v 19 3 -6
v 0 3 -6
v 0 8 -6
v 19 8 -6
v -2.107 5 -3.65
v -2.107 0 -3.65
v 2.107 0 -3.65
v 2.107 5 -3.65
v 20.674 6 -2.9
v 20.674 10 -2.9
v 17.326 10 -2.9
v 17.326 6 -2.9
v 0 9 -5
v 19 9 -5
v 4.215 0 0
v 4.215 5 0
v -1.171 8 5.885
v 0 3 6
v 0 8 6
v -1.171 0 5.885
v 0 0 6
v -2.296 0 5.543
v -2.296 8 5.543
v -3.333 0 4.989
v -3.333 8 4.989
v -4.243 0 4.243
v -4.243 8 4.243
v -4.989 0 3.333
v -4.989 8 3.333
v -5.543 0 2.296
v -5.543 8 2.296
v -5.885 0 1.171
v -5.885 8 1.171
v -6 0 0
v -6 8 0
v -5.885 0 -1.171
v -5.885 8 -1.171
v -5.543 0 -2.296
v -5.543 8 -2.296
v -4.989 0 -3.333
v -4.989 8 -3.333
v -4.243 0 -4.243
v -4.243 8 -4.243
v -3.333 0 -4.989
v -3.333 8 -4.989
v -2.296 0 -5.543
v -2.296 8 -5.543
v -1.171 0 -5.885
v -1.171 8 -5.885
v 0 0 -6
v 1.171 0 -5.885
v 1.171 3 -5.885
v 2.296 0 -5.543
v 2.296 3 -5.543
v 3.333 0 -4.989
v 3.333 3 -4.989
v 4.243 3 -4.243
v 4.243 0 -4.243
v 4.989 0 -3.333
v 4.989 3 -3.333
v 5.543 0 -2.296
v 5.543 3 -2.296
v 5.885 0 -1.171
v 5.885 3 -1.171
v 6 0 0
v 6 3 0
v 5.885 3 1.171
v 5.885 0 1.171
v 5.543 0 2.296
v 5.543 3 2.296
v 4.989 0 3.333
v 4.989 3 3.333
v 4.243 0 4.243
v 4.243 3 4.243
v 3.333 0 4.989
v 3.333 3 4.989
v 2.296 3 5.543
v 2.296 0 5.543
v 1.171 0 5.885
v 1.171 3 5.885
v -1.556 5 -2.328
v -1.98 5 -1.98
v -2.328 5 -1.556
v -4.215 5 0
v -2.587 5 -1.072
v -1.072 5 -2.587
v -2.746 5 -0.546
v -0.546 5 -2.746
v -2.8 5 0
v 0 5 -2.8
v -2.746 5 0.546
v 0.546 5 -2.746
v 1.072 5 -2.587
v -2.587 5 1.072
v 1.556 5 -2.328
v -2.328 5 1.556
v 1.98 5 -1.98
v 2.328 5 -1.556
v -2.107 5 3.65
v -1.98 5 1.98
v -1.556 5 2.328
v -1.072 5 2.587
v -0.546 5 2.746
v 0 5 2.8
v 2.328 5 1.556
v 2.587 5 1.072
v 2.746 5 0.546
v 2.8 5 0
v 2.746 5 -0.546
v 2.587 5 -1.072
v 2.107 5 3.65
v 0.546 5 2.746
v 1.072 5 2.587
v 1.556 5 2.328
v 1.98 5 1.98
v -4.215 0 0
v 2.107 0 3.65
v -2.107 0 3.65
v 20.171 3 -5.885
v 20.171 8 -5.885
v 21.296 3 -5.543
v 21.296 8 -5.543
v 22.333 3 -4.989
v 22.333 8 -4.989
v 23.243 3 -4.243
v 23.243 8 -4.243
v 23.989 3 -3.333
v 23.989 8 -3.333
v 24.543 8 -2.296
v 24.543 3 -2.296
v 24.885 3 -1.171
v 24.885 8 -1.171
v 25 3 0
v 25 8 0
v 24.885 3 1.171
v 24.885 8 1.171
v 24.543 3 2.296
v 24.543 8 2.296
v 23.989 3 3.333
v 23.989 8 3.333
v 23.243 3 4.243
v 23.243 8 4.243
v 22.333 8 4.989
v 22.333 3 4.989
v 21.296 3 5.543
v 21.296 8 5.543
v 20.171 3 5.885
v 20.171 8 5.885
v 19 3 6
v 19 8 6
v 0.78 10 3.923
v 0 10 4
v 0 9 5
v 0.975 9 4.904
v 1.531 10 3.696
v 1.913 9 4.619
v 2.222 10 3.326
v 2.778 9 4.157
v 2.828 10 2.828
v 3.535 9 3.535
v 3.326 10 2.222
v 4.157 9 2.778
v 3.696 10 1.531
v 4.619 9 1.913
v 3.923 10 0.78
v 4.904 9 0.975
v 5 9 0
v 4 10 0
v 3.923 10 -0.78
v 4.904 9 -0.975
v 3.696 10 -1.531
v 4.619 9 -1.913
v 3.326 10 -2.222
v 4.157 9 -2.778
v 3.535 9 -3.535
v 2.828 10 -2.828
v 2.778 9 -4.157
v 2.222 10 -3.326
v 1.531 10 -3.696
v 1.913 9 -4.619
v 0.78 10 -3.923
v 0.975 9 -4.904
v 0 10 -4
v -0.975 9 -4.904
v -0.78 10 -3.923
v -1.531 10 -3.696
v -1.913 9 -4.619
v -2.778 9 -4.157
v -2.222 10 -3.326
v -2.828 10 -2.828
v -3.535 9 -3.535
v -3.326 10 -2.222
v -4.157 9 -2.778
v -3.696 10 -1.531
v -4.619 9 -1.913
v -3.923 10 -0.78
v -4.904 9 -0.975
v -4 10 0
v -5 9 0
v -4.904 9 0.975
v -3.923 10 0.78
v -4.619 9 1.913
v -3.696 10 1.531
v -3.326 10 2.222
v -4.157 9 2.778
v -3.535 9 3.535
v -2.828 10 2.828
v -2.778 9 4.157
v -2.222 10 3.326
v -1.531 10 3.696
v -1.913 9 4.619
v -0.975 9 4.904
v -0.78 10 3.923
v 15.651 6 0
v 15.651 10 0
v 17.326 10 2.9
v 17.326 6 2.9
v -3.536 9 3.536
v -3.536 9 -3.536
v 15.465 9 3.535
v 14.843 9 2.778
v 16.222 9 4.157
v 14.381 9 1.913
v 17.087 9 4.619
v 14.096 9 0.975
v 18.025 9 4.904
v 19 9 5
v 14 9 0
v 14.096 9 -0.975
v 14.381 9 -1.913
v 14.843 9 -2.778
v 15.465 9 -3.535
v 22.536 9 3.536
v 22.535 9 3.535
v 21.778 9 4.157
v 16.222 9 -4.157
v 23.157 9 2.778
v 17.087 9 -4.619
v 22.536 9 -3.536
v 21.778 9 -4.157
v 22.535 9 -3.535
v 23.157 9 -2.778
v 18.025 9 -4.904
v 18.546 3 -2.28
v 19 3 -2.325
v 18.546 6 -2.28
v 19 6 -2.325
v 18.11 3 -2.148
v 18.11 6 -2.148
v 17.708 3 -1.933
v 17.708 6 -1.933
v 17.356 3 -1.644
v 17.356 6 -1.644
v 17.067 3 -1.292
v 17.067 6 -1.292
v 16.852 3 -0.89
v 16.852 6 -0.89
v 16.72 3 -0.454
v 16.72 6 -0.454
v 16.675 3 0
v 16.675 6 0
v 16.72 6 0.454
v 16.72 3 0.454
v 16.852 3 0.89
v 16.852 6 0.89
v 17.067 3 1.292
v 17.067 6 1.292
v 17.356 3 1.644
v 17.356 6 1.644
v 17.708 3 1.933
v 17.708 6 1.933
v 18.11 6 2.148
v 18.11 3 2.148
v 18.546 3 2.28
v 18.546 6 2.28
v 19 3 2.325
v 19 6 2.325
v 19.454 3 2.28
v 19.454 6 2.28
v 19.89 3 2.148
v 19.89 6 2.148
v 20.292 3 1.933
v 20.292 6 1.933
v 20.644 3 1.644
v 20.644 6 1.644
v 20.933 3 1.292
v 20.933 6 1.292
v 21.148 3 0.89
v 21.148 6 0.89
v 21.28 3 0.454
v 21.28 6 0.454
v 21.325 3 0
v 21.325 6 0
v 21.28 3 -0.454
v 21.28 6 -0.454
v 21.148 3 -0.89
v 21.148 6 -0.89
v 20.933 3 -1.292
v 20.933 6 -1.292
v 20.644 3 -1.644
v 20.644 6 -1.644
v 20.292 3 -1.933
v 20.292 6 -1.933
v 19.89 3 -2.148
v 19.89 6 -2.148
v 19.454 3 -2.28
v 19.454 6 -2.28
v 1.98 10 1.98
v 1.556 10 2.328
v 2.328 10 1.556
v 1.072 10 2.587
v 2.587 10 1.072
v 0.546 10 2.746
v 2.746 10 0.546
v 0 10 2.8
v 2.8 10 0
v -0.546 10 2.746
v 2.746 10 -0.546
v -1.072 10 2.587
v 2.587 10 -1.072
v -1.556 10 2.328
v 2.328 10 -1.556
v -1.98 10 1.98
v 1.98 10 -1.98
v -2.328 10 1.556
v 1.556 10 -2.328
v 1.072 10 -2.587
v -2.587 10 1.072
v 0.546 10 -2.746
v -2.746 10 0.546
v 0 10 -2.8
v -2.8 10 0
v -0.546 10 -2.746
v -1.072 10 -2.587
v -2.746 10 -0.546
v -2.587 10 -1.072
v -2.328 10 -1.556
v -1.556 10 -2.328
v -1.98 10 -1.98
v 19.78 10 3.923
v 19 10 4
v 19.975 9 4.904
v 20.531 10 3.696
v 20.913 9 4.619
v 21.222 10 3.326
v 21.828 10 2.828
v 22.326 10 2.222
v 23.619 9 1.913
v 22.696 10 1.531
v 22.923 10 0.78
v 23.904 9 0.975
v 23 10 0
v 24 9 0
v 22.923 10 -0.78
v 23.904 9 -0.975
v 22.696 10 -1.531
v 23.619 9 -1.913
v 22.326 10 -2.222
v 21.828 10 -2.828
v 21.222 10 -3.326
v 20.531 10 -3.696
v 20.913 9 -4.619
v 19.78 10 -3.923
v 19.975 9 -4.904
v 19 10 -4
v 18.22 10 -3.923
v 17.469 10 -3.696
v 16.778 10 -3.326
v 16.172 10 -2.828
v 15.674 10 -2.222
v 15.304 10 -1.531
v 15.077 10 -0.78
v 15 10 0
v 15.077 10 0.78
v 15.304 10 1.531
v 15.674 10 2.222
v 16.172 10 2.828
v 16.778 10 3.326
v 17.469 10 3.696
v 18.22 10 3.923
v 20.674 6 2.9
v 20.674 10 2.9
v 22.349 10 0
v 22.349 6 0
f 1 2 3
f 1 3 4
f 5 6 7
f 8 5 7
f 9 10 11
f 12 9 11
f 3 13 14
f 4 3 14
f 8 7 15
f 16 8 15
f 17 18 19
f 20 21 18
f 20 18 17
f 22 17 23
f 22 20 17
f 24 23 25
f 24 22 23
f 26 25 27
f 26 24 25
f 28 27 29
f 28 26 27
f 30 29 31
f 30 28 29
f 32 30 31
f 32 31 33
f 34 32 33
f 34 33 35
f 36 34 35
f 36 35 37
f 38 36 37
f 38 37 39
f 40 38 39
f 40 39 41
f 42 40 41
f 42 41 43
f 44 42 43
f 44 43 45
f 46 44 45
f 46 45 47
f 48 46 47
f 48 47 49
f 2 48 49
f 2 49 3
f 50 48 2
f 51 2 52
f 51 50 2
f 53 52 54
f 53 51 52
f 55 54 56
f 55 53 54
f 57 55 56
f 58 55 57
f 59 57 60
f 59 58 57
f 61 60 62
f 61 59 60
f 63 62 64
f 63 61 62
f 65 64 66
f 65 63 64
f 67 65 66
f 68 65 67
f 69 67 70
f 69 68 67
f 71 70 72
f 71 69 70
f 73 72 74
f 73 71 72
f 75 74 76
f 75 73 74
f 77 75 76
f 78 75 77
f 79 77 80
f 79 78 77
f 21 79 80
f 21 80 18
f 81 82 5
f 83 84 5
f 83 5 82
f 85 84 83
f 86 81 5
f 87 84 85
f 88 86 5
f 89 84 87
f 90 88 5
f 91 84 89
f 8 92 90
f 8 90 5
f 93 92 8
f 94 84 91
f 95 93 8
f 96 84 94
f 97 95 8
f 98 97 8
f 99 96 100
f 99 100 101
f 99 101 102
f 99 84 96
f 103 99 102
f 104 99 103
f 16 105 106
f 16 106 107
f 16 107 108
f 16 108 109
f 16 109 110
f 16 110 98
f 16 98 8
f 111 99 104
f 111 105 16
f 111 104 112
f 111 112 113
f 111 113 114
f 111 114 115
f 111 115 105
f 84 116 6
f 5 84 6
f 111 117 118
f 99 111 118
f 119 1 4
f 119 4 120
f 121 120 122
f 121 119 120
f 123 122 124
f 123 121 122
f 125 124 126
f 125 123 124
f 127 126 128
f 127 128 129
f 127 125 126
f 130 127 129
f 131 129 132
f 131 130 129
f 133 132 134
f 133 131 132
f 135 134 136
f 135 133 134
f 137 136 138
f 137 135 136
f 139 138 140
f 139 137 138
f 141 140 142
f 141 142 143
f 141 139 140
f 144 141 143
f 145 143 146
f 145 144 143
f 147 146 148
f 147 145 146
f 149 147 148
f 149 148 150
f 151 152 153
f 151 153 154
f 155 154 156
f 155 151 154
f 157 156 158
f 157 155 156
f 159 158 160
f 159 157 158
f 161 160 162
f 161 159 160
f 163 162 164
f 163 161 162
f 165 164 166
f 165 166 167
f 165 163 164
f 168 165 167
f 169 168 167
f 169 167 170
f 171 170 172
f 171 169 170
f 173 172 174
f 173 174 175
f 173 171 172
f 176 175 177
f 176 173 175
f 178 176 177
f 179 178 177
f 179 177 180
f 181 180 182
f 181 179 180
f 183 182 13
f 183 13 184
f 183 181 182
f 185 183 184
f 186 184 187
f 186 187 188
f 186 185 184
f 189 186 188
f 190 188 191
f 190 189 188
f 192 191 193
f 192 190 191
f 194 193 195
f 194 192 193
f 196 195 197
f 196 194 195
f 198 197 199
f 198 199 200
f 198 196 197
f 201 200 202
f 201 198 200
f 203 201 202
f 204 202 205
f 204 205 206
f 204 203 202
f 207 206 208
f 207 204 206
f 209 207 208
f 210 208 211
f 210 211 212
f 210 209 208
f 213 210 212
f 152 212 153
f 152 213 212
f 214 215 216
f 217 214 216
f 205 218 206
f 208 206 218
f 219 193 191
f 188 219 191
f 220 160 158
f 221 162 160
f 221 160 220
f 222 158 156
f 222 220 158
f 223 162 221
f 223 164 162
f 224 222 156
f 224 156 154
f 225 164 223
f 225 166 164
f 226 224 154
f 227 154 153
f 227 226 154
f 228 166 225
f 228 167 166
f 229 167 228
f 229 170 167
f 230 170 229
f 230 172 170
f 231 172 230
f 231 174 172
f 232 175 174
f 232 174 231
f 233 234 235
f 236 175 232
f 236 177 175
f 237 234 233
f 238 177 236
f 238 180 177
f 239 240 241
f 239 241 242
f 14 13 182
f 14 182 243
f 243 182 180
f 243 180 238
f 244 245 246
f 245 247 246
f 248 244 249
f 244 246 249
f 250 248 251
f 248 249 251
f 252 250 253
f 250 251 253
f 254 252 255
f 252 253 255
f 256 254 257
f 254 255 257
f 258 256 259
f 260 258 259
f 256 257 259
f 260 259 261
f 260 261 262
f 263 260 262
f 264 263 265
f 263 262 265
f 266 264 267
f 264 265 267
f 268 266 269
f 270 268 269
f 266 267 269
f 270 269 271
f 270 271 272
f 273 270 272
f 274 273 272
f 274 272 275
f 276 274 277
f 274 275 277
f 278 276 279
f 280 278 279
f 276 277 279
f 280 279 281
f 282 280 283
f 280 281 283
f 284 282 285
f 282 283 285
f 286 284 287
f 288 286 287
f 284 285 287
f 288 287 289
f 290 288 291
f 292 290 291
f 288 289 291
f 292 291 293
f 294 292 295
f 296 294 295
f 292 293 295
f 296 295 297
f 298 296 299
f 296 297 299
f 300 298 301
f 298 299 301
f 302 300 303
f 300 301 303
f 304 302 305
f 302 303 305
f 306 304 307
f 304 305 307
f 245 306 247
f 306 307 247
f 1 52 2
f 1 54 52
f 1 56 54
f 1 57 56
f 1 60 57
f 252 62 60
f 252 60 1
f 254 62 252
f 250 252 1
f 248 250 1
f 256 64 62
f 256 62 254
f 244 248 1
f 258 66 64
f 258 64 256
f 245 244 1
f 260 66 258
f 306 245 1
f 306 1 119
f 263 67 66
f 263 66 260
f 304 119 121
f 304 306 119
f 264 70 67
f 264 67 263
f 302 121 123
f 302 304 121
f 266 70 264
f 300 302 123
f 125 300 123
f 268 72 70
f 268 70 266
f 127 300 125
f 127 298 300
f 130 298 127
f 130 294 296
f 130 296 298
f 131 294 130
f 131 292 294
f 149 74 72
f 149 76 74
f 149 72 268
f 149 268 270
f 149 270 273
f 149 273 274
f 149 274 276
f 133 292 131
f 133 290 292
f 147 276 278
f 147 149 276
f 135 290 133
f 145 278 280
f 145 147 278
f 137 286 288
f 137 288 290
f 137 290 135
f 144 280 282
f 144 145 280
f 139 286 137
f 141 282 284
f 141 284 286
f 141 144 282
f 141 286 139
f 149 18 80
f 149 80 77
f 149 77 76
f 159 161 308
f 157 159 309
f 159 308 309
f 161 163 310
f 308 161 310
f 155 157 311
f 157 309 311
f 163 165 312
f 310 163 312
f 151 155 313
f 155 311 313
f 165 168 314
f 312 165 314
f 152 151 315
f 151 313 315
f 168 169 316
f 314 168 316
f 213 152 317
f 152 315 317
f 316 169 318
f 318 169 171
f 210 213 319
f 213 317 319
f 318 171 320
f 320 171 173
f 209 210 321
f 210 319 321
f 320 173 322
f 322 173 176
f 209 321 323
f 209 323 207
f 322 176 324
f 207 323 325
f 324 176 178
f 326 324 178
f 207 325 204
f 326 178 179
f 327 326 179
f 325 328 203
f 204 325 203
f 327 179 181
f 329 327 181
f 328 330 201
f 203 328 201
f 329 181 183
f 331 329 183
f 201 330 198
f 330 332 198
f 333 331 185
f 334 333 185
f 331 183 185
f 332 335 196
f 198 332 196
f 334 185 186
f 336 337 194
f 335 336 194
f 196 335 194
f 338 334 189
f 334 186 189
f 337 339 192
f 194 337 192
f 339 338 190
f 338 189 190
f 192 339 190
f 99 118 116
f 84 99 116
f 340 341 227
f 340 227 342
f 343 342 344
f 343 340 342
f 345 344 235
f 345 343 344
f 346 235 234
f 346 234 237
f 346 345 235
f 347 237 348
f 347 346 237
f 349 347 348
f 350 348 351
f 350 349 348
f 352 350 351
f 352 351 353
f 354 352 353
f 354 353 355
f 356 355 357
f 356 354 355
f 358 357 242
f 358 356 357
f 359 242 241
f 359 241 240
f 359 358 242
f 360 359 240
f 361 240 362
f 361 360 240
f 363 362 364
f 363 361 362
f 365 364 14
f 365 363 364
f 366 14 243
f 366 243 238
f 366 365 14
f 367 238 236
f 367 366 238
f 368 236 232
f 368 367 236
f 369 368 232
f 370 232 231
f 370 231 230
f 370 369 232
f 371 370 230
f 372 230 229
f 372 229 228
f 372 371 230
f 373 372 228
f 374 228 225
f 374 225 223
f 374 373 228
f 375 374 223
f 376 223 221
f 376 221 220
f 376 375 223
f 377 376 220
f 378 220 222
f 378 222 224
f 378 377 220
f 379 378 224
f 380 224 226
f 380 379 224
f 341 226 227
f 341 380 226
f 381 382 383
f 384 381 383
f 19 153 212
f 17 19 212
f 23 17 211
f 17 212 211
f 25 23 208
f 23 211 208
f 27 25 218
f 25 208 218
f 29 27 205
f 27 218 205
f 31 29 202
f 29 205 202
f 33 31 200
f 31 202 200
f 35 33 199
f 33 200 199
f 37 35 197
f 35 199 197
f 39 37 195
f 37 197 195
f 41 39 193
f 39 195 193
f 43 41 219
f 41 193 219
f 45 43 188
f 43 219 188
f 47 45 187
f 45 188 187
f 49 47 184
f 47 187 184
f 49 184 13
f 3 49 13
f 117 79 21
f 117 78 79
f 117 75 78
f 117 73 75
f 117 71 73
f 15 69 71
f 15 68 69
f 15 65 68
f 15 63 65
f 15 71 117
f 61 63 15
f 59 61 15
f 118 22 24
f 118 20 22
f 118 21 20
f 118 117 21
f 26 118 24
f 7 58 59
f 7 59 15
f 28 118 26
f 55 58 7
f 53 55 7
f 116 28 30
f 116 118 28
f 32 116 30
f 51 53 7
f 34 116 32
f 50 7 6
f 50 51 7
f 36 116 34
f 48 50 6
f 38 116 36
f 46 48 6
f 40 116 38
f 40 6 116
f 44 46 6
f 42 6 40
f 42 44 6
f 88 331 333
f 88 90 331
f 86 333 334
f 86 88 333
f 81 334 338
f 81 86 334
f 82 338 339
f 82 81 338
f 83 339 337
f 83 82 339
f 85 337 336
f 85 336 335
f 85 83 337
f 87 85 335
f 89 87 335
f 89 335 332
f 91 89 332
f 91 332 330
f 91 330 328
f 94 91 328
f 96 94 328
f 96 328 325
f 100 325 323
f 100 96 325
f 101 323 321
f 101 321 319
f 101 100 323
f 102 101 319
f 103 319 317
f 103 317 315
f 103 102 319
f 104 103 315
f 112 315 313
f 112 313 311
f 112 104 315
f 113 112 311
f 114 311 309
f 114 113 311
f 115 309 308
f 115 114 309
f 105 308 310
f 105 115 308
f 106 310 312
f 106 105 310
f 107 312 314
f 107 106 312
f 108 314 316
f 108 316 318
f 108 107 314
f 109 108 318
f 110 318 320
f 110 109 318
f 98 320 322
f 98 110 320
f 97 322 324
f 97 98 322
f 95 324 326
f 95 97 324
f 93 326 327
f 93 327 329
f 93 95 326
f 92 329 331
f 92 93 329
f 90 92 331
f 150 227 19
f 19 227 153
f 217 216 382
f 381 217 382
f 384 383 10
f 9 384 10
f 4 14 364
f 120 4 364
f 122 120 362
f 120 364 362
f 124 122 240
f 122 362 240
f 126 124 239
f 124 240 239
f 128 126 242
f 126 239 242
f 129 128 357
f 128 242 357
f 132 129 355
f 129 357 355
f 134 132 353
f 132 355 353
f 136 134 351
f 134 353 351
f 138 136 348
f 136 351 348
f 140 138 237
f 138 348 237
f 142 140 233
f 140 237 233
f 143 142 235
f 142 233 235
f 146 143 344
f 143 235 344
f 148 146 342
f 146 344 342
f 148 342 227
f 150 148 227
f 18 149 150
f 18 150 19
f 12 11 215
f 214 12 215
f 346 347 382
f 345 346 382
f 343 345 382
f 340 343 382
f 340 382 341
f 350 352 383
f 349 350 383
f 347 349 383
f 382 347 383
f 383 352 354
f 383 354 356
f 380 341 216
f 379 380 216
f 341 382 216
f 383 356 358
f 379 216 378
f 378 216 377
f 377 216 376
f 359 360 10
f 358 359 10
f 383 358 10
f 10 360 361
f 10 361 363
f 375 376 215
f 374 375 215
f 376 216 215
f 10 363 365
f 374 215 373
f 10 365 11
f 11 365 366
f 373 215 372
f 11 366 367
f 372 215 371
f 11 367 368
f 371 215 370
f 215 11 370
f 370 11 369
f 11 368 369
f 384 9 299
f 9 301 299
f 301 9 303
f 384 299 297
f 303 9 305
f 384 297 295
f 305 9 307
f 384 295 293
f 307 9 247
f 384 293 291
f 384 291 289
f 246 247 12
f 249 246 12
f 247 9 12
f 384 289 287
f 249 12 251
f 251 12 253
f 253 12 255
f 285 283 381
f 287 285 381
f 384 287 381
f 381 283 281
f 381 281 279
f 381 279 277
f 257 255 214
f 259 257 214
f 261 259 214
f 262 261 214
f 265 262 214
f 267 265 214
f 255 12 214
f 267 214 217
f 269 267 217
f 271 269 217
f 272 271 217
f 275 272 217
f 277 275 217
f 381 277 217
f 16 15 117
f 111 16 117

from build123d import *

# Parameters (mm, degrees)
EXTRUDE_1_DEPTH     = 10
CHAMFER_1_SIZE      = 2
CUT_EXTRUDE_1_DEPTH = 5
SKETCH_5_R          = 32.43595028
SKETCH_5_R_2        = 6
CUT_EXTRUDE_2_DEPTH = 3
CUT_EXTRUDE_3_DEPTH = 4
SKETCH_7_W          = 54.061660739
SKETCH_7_H          = 47.527586942
SKETCH_7_R          = 4
CUT_EXTRUDE_4_DEPTH = 1
CHAMFER_2_SIZE      = 1


with BuildPart() as part:
    # 草图1 → 凸台-拉伸1 (new body)
    with BuildSketch(Plane(origin=(0, 0, 0), x_dir=(1, 0, 0), z_dir=(0, 1, 0))):
        with BuildLine():
            Line((0, 6), (19, 6))
            ThreePointArc((19, 6), (25, 0), (19, -6))
            Line((19, -6), (0, -6))
            ThreePointArc((0, -6), (-6, 0), (0, 6))
        make_face()
    extrude(amount=EXTRUDE_1_DEPTH)

    # 草图2 → 切除-旋转1 (revolve, cut)
    with BuildSketch(Plane.XY, mode=Mode.PRIVATE) as cut_revolve_1_sk:
        Polygon((0, 10), (-2.8, 10), (-2.8, 5), (-1.85, 5), (-1.85, 2), (-2.8, 2), (-2.8, 0), (0, 0), align=None)
    revolve(cut_revolve_1_sk.sketch.rotate(Axis((0, -1.427566958, 0), (0, 1, 0)), 270), axis=Axis((0, -1.427566958, 0), (0, 1, 0)), mode=Mode.SUBTRACT)

    # 草图3 → 切除-旋转2 (revolve, cut)
    with BuildSketch(Plane.XY, mode=Mode.PRIVATE) as cut_revolve_2_sk:
        Polygon((19, 0), (16.675, 0), (16.675, 6), (16.25, 6), (16.25, 10), (19, 10), align=None)
    revolve(cut_revolve_2_sk.sketch.rotate(Axis((19, 0, 0), (0, 1, 0)), 270), axis=Axis((19, 0, 0), (0, 1, 0)), mode=Mode.SUBTRACT)

    # 倒角1
    chamfer_1_edges = [part.edges().sort_by_distance(p)[0] for p in [
        (25, 10, 0),
        (9.5, 10, -6),
        (-6, 10, 0),
        (9.5, 10, 6),
    ]]
    chamfer(chamfer_1_edges, length=CHAMFER_1_SIZE)

    # 草图4 → 切除-拉伸1 (cut)
    with BuildSketch(Plane.XZ):
        Polygon((2.107328483, 3.65), (-2.107328483, 3.65), (-4.214656965, 0), (-2.107328483, -3.65), (2.107328483, -3.65), (4.214656965, 0), align=None)
    extrude(amount=-CUT_EXTRUDE_1_DEPTH, mode=Mode.SUBTRACT)

    # 草图5 → 切除-拉伸2 (cut)
    with BuildSketch(Plane.XZ):
        Circle(SKETCH_5_R)
        with Locations(Location((0, 0, 0), (0, 0, 90))):
            Circle(SKETCH_5_R_2, mode=Mode.SUBTRACT)
    extrude(amount=-CUT_EXTRUDE_2_DEPTH, mode=Mode.SUBTRACT)

    # 草图6 → 切除-拉伸3 (cut)
    with BuildSketch(Plane(origin=(0, 10, 0), x_dir=(1, 0, 0), z_dir=(0, 1, 0))):
        Polygon((20.674315781, 2.9), (17.325684219, 2.9), (15.651368439, 0), (17.325684219, -2.9), (20.674315781, -2.9), (22.348631561, 0), align=None)
    extrude(amount=-CUT_EXTRUDE_3_DEPTH, mode=Mode.SUBTRACT)

    # 草图7 → 切除-拉伸4 (cut)
    with BuildSketch(Plane(origin=(0, 10, 0), x_dir=(1, 0, 0), z_dir=(0, 1, 0))):
        with Locations((6.682015694, 1.141108586)):
            Rectangle(SKETCH_7_W, SKETCH_7_H)
        with Locations(Location((0, 0, 0), (0, 0, 270))):
            Circle(SKETCH_7_R, mode=Mode.SUBTRACT)
        with Locations(Location((19, 0, 0), (0, 0, 270))):
            Circle(SKETCH_7_R, mode=Mode.SUBTRACT)
    extrude(amount=-CUT_EXTRUDE_4_DEPTH, mode=Mode.SUBTRACT)

    # 倒角2
    chamfer_2_edges = [part.edges().sort_by_distance(p)[0] for p in [
        (19, 9, -4),
        (0, 9, -4),
    ]]
    chamfer(chamfer_2_edges, length=CHAMFER_2_SIZE - 0.0001)  # a hair under: the kernel refuses the full size


solid = part.part
